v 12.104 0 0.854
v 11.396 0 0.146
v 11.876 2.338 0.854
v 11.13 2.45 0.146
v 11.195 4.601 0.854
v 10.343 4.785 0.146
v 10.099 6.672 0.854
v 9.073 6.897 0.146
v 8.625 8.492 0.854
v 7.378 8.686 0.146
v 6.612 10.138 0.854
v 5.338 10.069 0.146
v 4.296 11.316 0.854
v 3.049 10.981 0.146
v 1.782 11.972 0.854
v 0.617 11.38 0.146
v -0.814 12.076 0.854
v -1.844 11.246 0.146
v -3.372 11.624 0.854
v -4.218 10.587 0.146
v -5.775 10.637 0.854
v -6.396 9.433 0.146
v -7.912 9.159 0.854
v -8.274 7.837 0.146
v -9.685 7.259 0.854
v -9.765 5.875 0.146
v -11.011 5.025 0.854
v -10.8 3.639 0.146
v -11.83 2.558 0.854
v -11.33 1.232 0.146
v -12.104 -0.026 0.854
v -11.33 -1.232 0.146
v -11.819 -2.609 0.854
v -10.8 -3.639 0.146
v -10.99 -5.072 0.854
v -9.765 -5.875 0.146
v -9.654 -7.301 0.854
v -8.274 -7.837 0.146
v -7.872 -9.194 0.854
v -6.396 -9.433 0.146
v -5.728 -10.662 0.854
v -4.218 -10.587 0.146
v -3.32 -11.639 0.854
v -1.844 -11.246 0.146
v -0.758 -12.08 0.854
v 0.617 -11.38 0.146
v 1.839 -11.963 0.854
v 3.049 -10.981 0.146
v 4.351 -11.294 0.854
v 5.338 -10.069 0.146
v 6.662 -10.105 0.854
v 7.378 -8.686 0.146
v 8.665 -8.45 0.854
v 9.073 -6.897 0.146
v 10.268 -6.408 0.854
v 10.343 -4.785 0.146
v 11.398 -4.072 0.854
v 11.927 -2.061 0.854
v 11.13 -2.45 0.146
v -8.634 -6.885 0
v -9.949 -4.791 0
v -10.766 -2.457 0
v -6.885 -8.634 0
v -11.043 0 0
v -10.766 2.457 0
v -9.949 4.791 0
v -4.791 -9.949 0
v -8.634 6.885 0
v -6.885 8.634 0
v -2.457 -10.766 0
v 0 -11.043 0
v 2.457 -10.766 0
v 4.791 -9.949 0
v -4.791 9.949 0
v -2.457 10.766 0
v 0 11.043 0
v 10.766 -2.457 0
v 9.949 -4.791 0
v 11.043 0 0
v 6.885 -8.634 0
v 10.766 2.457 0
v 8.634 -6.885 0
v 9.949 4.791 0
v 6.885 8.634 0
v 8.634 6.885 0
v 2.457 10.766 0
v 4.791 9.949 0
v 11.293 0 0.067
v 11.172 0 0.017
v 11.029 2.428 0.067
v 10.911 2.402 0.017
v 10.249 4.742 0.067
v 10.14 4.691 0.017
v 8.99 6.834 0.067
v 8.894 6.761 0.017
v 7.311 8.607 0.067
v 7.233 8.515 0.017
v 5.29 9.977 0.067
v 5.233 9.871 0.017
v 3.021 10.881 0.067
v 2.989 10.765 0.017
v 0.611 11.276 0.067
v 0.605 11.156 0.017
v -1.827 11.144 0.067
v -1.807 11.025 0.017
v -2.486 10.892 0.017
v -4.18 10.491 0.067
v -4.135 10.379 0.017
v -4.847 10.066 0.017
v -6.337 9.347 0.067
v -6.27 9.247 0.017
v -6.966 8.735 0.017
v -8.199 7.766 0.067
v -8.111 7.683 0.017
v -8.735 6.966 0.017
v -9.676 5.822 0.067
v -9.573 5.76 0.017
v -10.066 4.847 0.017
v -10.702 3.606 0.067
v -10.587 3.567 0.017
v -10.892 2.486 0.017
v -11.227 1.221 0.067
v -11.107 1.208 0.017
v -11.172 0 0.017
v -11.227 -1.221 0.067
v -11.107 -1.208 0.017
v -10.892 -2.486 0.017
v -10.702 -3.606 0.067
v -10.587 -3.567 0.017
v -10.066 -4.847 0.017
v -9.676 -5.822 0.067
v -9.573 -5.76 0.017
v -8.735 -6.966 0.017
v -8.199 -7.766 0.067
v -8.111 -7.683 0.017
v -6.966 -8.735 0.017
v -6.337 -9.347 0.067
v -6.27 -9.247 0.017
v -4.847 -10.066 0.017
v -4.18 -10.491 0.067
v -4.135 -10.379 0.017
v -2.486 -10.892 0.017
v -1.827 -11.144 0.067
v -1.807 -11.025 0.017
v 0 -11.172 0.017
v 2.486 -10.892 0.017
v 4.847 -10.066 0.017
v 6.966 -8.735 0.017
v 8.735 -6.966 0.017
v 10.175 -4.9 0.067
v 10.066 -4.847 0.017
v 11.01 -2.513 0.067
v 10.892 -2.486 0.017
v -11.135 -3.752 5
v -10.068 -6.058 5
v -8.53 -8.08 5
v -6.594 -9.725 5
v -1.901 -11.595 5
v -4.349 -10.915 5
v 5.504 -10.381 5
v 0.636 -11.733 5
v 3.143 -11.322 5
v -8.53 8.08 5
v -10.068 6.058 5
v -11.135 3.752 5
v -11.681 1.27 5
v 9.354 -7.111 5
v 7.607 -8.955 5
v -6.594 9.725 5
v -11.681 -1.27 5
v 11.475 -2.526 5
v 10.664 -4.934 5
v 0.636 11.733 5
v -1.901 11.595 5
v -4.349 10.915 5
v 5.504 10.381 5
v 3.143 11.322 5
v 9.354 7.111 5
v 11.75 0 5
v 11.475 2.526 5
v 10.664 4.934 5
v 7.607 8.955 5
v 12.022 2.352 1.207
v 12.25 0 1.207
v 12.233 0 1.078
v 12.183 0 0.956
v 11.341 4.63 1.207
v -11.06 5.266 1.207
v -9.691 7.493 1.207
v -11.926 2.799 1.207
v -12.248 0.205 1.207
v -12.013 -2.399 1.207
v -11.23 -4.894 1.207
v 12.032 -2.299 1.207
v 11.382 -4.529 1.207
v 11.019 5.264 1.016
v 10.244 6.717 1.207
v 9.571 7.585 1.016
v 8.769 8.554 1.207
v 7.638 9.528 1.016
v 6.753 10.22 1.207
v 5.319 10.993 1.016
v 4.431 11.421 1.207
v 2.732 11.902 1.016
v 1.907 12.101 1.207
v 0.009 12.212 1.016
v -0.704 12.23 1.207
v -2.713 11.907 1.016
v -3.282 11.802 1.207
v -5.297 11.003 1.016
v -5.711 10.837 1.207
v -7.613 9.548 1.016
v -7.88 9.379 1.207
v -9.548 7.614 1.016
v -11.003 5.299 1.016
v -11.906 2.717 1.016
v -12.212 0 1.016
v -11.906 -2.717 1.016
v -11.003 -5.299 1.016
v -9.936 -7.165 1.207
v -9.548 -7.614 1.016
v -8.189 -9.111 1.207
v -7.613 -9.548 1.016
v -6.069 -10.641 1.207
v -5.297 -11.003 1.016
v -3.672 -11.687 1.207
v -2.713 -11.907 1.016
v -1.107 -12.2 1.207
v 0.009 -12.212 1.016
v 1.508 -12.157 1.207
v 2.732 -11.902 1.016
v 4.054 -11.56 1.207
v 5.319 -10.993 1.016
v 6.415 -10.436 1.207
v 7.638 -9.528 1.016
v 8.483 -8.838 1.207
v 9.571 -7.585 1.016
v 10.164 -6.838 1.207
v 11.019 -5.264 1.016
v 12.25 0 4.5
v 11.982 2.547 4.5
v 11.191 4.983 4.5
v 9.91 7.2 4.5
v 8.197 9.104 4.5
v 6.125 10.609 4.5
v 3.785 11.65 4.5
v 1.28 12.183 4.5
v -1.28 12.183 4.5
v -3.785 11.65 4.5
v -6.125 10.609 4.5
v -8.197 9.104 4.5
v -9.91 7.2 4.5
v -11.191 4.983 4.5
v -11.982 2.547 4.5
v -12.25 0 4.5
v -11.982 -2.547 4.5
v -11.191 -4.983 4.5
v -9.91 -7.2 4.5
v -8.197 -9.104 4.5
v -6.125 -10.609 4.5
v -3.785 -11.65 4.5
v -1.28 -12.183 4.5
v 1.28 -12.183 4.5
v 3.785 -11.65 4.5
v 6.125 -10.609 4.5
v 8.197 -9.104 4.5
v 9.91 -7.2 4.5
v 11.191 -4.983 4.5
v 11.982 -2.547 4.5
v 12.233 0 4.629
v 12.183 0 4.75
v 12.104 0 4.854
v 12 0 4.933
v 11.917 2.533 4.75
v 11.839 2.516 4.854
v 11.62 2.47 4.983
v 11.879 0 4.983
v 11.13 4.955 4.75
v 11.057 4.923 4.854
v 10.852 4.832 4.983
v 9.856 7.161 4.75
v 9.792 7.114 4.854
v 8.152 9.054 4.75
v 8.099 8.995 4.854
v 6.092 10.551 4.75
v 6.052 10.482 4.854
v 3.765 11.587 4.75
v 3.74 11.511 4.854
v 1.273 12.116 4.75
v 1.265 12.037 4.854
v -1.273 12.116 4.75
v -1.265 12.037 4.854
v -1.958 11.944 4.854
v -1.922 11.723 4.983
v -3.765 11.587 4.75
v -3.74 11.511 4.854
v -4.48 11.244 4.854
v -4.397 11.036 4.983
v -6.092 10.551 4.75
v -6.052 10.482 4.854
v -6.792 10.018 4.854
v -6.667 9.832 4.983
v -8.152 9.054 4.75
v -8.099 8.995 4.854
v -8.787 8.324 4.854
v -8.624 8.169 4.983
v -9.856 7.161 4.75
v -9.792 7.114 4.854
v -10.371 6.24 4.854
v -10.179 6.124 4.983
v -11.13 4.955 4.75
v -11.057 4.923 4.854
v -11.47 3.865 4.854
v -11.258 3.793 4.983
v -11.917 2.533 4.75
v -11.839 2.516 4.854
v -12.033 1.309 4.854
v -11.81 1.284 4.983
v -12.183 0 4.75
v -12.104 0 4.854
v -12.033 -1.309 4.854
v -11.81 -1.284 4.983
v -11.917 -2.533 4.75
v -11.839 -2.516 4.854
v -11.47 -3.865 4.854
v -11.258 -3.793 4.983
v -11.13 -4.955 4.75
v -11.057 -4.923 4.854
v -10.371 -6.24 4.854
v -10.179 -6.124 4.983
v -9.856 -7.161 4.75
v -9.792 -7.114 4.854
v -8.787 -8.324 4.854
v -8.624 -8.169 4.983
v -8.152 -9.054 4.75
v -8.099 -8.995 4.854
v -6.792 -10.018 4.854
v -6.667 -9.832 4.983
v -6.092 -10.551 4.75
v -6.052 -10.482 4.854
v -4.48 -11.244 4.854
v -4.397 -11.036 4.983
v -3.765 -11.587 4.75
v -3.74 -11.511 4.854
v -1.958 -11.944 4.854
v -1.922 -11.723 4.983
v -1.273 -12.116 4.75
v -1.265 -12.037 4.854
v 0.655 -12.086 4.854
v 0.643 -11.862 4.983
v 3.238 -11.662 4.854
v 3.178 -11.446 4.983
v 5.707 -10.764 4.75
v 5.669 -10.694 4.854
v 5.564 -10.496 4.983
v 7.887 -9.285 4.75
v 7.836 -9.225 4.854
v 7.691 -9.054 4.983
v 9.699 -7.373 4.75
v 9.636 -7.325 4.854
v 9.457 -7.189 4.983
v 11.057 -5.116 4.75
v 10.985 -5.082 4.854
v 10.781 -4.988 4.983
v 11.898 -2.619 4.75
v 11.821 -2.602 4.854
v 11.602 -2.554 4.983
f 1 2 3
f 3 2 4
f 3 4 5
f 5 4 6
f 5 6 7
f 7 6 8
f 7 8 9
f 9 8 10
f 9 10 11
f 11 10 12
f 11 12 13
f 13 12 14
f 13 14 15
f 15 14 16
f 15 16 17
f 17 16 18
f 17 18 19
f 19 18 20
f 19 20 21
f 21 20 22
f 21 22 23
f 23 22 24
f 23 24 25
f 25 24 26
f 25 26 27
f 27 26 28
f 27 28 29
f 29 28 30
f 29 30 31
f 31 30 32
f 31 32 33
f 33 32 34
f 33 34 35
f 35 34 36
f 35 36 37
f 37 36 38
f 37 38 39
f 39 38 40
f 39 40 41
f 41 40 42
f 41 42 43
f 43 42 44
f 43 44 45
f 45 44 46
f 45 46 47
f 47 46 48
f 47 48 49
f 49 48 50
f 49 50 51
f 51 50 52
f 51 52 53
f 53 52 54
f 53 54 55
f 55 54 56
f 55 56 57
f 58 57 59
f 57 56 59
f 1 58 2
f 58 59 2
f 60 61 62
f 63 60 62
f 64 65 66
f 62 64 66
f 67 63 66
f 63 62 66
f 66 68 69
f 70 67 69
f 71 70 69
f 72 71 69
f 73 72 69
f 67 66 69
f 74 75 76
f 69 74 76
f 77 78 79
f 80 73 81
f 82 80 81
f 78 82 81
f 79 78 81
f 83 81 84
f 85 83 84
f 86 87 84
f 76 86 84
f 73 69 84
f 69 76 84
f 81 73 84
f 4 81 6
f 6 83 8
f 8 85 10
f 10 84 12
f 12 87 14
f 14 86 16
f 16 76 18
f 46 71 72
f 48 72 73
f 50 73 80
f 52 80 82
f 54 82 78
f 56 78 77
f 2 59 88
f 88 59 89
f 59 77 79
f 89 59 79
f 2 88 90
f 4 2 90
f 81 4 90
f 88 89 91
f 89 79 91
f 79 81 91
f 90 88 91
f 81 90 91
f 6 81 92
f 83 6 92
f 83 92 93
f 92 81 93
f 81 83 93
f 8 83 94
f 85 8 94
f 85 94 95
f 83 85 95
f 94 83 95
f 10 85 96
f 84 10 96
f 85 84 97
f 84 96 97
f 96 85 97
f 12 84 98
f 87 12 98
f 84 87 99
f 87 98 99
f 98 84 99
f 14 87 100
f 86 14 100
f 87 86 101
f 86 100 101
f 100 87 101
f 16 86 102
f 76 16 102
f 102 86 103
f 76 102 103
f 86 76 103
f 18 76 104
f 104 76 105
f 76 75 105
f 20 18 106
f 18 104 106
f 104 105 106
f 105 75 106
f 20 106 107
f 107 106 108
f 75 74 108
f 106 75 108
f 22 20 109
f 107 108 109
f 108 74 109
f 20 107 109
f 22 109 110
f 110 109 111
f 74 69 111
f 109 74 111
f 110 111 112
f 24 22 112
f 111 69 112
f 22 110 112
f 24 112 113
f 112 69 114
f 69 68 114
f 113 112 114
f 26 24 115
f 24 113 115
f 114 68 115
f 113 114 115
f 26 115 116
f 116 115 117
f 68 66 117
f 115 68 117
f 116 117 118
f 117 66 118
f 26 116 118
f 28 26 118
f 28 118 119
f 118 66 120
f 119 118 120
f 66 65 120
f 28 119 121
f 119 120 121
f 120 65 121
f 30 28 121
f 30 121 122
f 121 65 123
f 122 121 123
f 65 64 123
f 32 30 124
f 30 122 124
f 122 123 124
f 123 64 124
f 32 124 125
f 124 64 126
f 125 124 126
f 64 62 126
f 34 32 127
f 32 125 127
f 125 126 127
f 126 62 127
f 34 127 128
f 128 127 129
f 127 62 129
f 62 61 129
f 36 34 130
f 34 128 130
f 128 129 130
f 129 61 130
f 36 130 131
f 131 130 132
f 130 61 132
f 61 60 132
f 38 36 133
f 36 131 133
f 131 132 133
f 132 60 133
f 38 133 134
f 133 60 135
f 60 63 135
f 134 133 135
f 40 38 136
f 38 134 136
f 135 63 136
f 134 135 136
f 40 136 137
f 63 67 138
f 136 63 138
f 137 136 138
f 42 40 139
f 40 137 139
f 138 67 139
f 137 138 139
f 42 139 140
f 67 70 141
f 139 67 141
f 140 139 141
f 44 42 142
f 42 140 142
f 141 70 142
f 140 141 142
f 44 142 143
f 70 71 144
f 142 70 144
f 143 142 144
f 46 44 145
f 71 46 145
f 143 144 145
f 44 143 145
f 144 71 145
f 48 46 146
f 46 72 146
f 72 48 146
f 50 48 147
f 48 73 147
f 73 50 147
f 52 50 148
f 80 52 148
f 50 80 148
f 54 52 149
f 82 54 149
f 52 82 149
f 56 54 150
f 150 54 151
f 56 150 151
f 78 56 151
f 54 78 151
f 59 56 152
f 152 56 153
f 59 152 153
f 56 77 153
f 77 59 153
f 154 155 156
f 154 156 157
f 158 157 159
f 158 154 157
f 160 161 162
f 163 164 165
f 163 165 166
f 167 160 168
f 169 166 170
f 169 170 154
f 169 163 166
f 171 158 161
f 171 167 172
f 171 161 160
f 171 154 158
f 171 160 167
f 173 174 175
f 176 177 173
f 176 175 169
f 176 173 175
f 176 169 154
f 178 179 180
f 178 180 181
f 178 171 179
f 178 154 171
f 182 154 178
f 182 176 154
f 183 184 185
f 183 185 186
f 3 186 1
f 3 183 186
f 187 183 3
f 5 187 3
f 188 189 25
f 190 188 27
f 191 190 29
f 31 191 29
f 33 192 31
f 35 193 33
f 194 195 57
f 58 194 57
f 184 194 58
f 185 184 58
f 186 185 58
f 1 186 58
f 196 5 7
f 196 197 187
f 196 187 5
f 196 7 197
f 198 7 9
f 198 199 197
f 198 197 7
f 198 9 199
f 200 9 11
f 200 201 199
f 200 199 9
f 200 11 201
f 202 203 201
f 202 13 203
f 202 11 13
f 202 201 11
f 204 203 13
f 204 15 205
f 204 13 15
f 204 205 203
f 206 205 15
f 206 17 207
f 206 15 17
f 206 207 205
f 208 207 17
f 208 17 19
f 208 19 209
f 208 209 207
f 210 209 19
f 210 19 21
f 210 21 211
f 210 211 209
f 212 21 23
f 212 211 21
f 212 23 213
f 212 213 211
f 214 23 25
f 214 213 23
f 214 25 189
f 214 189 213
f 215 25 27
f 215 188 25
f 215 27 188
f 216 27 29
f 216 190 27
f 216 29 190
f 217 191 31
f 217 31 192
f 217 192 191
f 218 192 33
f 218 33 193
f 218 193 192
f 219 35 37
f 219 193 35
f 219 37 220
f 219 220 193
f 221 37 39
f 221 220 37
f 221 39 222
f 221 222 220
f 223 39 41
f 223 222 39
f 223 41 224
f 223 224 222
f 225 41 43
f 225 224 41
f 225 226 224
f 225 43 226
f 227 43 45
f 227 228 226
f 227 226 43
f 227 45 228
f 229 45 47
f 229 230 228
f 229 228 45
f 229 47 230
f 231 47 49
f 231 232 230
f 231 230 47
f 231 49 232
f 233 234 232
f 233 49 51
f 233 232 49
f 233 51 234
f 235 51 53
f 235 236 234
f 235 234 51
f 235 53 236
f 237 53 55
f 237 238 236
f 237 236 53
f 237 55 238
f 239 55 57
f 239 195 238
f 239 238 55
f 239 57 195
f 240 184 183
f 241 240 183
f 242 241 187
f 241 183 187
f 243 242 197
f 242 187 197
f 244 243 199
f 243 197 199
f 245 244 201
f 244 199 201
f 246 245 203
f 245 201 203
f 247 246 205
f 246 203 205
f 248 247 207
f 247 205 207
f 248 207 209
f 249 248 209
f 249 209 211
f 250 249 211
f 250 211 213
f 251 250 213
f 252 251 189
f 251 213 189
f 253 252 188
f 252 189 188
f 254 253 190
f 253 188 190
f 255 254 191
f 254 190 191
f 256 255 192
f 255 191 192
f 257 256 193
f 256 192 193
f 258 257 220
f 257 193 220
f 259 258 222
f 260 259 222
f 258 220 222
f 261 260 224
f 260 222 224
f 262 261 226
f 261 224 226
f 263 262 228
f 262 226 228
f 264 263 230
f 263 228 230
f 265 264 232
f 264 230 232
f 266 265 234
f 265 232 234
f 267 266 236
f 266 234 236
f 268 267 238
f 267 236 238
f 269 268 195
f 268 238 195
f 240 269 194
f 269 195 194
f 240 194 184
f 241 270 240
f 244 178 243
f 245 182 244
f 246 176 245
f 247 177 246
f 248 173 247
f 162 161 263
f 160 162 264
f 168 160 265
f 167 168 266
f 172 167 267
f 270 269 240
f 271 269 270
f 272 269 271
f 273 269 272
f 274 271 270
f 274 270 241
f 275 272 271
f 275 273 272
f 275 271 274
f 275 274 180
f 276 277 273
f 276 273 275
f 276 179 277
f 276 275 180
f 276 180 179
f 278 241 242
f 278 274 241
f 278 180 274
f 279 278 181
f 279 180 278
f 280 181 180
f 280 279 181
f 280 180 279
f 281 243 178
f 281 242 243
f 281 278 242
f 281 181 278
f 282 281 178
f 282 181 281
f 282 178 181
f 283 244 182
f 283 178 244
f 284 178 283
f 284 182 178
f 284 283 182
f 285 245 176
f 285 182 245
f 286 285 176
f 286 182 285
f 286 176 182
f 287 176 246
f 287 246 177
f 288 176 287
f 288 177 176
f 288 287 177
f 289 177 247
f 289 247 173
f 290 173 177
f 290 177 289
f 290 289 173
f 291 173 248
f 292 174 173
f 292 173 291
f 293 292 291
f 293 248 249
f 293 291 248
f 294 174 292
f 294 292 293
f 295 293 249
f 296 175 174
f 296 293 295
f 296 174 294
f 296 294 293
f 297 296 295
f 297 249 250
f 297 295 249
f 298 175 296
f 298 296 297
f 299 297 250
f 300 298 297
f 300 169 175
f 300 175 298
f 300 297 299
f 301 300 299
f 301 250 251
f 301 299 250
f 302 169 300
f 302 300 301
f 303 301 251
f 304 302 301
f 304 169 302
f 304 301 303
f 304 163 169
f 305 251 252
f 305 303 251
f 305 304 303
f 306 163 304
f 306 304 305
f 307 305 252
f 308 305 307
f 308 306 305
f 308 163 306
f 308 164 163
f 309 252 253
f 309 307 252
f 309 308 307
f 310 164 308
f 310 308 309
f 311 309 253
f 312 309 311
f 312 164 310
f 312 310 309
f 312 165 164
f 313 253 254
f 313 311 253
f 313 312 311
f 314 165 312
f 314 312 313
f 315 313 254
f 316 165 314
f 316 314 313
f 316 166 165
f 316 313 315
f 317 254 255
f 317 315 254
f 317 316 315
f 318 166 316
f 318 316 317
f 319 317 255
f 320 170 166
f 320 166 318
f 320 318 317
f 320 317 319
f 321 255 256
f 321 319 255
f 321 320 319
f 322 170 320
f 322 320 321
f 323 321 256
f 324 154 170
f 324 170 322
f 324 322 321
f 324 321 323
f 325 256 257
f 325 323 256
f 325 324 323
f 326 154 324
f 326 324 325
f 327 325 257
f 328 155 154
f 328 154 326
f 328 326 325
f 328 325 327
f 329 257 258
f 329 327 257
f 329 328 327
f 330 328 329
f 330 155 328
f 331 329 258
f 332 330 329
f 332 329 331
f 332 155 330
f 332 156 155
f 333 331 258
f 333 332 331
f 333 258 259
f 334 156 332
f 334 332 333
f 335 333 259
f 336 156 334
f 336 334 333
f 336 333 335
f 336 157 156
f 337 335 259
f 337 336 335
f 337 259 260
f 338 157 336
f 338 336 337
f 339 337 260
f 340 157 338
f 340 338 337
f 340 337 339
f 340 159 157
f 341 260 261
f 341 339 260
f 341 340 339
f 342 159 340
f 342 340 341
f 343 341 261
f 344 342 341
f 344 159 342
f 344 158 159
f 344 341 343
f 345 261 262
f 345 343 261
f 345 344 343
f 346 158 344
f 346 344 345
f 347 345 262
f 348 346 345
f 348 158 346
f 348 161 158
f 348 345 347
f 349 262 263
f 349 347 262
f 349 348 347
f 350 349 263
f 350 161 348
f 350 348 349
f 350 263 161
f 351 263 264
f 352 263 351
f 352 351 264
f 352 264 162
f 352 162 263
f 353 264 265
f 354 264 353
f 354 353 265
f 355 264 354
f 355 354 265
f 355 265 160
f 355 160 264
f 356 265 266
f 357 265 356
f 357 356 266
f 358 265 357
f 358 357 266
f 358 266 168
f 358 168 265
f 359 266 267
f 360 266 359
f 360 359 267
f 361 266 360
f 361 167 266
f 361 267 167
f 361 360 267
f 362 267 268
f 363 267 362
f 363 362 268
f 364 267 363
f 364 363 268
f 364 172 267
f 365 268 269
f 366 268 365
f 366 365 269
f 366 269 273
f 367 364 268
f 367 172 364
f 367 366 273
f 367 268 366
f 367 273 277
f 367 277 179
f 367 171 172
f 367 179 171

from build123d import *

# Parameters (mm, degrees)
F0_R     = 12.25
F1_DEPTH = 5
F2_SIZE  = 1
F3_R     = 0.5


with BuildPart() as f1:
    # F0 (on Top) → F1 (new body)
    with BuildSketch(Plane.XY):
        Circle(F0_R)
    extrude(amount=F1_DEPTH)

    # F2
    f2_edges = [f1.edges().sort_by_distance(p)[0] for p in [
        (-12.25, 0, 0),
    ]]
    chamfer(f2_edges, length=F2_SIZE)

    # F3
    f3_edges = [f1.edges().sort_by_distance(p)[0] for p in [
        (-12.25, 0, 5),
        (-12.25, 0, 1),
        (-11.25, 0, 0),
    ]]
    fillet(f3_edges, radius=F3_R)


solid = f1.part
